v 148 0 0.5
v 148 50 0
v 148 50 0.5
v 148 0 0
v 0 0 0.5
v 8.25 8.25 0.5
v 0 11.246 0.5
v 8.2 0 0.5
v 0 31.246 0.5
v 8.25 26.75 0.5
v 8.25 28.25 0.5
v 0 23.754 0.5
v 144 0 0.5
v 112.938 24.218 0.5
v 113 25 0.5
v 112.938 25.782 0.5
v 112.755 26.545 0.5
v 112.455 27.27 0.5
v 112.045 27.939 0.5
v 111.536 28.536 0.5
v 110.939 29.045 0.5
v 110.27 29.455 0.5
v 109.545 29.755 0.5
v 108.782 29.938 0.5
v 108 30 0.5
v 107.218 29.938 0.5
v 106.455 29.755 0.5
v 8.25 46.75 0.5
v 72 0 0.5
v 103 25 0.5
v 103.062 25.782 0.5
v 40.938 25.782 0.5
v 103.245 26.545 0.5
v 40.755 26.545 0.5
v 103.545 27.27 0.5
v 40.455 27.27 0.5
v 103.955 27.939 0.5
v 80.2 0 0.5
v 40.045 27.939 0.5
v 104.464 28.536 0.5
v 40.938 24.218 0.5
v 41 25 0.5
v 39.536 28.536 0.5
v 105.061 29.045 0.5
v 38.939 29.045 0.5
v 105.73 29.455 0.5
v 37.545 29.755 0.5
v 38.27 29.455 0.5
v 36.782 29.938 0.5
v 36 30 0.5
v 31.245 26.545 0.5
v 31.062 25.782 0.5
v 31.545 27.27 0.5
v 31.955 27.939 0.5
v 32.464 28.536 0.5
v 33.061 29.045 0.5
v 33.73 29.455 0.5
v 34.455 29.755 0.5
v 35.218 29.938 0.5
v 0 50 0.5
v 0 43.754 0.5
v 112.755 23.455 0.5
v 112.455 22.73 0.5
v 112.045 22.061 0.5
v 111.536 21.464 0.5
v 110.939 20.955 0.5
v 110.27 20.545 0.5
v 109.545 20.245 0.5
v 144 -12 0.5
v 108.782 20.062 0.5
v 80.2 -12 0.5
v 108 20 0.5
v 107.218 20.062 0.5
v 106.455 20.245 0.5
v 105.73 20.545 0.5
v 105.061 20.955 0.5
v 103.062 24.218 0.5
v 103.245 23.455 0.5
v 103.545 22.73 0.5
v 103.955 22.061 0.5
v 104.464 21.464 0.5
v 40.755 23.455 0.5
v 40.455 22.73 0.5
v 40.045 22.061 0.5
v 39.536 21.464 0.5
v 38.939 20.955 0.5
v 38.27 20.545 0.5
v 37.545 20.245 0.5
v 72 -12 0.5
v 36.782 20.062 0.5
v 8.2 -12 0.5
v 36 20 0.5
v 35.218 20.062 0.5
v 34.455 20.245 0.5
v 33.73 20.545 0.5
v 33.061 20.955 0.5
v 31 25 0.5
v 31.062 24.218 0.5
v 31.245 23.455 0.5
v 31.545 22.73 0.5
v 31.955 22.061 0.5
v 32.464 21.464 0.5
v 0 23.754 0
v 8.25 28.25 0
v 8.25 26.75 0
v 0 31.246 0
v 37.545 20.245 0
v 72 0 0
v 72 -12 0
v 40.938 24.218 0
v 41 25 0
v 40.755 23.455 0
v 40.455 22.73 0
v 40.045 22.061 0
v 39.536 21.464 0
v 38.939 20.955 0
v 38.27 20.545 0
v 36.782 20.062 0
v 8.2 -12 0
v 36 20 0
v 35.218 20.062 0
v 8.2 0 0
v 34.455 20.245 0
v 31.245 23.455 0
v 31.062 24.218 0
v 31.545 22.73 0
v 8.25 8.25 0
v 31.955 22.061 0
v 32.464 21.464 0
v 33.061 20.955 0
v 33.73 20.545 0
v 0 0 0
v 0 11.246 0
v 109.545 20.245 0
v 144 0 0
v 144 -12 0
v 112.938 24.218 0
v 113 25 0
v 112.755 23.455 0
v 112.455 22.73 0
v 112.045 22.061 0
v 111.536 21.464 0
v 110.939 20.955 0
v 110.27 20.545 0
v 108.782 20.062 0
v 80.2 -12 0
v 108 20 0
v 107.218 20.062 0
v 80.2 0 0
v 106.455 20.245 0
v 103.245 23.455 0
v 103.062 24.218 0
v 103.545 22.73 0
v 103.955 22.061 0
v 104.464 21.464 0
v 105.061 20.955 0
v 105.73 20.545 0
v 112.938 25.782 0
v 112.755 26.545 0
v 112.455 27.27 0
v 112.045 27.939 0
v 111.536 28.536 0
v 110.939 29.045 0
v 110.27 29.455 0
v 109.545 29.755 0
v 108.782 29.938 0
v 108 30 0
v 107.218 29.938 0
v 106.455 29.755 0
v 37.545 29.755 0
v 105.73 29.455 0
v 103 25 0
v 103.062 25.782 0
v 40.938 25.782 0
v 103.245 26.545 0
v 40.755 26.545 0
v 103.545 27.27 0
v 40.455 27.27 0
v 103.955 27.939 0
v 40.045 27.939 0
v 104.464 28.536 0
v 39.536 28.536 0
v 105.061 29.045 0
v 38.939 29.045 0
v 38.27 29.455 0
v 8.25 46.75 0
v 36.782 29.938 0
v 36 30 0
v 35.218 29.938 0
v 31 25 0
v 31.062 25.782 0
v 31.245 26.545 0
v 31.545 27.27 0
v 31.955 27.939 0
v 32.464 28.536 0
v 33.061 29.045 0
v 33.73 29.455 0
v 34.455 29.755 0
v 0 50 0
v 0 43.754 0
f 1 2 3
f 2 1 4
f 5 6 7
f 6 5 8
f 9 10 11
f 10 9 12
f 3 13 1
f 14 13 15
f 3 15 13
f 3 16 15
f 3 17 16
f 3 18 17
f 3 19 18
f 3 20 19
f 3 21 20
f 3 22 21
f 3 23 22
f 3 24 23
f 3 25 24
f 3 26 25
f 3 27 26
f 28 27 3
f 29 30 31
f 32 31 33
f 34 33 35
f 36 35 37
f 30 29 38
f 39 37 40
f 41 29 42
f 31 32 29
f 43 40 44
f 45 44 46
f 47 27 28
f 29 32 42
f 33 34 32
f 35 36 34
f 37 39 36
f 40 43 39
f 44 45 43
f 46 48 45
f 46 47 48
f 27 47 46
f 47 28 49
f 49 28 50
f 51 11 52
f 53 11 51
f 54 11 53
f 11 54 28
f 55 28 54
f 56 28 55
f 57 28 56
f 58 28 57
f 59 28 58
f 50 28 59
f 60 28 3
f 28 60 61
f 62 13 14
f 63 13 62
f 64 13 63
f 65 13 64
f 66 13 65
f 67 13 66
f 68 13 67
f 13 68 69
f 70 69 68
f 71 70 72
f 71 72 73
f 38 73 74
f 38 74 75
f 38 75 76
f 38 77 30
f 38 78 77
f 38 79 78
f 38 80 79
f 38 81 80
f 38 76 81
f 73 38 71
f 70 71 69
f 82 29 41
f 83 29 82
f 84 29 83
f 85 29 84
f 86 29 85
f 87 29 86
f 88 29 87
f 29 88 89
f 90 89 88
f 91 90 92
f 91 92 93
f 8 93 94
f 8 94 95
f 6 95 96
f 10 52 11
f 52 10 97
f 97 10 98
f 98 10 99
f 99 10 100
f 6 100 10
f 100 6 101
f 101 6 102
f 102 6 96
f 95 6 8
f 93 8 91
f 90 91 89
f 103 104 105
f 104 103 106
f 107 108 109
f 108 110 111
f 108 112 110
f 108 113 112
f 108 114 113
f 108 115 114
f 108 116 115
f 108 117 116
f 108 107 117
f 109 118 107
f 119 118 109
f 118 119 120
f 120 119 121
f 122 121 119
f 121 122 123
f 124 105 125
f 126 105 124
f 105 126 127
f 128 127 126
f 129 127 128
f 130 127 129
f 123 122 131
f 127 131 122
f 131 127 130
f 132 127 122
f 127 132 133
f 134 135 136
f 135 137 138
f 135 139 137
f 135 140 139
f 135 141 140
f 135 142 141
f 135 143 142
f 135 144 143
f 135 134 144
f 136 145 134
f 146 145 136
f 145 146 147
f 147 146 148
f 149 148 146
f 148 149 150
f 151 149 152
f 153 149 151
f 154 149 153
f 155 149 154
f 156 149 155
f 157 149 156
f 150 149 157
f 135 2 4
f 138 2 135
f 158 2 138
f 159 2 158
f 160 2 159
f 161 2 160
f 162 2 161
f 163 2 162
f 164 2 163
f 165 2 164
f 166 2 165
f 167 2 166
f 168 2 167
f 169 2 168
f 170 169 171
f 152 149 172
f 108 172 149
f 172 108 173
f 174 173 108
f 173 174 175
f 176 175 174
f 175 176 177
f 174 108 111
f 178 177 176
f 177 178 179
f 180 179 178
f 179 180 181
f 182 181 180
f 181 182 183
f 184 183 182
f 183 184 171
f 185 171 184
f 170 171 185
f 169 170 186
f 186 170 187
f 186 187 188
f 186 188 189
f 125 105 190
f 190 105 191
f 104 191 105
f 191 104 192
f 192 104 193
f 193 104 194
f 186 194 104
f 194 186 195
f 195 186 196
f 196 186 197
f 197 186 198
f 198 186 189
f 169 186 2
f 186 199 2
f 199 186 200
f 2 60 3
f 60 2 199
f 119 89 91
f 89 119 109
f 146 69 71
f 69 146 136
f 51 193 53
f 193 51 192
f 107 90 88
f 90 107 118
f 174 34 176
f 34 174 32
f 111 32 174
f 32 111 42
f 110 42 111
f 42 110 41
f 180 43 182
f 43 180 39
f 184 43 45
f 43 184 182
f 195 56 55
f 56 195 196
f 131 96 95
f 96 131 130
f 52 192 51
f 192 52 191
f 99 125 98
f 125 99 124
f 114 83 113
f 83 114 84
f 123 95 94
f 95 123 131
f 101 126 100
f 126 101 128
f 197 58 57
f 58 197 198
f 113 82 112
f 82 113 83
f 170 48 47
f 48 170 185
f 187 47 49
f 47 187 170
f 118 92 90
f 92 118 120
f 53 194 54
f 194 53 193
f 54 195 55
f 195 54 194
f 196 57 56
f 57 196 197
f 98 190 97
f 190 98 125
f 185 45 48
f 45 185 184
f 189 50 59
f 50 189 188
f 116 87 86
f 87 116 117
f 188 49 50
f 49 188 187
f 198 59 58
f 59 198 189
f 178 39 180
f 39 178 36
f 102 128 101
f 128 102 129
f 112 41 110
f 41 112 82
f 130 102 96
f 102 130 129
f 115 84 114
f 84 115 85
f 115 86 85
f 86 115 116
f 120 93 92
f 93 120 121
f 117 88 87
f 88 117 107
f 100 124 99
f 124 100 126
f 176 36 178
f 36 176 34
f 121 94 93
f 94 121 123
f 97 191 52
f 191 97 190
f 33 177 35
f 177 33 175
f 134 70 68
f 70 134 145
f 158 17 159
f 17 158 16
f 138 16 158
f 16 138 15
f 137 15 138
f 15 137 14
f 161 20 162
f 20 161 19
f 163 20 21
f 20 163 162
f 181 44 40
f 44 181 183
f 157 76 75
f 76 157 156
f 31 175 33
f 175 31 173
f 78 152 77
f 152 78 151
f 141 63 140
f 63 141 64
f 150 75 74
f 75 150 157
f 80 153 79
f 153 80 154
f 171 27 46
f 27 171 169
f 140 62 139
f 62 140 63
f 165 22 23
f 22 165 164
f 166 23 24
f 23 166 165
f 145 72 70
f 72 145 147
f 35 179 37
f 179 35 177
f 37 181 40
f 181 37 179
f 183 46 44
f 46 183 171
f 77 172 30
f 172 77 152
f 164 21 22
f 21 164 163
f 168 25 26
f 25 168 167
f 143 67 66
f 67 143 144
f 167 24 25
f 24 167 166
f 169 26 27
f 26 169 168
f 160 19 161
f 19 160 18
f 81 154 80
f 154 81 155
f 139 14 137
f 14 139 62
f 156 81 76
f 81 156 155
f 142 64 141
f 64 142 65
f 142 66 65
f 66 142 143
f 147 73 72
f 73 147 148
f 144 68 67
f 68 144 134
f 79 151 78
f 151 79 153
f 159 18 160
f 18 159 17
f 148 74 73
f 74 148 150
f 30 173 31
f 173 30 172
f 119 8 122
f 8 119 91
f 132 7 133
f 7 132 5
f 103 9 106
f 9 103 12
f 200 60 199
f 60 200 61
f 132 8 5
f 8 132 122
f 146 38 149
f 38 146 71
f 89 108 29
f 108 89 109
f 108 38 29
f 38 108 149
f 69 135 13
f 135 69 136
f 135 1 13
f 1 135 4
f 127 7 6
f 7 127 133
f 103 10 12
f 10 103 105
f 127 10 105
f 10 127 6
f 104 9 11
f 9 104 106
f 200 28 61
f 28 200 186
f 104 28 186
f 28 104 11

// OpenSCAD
include <../lib/filament-spool-roller-lib.scad>;
$fn = 40;
template_right();
